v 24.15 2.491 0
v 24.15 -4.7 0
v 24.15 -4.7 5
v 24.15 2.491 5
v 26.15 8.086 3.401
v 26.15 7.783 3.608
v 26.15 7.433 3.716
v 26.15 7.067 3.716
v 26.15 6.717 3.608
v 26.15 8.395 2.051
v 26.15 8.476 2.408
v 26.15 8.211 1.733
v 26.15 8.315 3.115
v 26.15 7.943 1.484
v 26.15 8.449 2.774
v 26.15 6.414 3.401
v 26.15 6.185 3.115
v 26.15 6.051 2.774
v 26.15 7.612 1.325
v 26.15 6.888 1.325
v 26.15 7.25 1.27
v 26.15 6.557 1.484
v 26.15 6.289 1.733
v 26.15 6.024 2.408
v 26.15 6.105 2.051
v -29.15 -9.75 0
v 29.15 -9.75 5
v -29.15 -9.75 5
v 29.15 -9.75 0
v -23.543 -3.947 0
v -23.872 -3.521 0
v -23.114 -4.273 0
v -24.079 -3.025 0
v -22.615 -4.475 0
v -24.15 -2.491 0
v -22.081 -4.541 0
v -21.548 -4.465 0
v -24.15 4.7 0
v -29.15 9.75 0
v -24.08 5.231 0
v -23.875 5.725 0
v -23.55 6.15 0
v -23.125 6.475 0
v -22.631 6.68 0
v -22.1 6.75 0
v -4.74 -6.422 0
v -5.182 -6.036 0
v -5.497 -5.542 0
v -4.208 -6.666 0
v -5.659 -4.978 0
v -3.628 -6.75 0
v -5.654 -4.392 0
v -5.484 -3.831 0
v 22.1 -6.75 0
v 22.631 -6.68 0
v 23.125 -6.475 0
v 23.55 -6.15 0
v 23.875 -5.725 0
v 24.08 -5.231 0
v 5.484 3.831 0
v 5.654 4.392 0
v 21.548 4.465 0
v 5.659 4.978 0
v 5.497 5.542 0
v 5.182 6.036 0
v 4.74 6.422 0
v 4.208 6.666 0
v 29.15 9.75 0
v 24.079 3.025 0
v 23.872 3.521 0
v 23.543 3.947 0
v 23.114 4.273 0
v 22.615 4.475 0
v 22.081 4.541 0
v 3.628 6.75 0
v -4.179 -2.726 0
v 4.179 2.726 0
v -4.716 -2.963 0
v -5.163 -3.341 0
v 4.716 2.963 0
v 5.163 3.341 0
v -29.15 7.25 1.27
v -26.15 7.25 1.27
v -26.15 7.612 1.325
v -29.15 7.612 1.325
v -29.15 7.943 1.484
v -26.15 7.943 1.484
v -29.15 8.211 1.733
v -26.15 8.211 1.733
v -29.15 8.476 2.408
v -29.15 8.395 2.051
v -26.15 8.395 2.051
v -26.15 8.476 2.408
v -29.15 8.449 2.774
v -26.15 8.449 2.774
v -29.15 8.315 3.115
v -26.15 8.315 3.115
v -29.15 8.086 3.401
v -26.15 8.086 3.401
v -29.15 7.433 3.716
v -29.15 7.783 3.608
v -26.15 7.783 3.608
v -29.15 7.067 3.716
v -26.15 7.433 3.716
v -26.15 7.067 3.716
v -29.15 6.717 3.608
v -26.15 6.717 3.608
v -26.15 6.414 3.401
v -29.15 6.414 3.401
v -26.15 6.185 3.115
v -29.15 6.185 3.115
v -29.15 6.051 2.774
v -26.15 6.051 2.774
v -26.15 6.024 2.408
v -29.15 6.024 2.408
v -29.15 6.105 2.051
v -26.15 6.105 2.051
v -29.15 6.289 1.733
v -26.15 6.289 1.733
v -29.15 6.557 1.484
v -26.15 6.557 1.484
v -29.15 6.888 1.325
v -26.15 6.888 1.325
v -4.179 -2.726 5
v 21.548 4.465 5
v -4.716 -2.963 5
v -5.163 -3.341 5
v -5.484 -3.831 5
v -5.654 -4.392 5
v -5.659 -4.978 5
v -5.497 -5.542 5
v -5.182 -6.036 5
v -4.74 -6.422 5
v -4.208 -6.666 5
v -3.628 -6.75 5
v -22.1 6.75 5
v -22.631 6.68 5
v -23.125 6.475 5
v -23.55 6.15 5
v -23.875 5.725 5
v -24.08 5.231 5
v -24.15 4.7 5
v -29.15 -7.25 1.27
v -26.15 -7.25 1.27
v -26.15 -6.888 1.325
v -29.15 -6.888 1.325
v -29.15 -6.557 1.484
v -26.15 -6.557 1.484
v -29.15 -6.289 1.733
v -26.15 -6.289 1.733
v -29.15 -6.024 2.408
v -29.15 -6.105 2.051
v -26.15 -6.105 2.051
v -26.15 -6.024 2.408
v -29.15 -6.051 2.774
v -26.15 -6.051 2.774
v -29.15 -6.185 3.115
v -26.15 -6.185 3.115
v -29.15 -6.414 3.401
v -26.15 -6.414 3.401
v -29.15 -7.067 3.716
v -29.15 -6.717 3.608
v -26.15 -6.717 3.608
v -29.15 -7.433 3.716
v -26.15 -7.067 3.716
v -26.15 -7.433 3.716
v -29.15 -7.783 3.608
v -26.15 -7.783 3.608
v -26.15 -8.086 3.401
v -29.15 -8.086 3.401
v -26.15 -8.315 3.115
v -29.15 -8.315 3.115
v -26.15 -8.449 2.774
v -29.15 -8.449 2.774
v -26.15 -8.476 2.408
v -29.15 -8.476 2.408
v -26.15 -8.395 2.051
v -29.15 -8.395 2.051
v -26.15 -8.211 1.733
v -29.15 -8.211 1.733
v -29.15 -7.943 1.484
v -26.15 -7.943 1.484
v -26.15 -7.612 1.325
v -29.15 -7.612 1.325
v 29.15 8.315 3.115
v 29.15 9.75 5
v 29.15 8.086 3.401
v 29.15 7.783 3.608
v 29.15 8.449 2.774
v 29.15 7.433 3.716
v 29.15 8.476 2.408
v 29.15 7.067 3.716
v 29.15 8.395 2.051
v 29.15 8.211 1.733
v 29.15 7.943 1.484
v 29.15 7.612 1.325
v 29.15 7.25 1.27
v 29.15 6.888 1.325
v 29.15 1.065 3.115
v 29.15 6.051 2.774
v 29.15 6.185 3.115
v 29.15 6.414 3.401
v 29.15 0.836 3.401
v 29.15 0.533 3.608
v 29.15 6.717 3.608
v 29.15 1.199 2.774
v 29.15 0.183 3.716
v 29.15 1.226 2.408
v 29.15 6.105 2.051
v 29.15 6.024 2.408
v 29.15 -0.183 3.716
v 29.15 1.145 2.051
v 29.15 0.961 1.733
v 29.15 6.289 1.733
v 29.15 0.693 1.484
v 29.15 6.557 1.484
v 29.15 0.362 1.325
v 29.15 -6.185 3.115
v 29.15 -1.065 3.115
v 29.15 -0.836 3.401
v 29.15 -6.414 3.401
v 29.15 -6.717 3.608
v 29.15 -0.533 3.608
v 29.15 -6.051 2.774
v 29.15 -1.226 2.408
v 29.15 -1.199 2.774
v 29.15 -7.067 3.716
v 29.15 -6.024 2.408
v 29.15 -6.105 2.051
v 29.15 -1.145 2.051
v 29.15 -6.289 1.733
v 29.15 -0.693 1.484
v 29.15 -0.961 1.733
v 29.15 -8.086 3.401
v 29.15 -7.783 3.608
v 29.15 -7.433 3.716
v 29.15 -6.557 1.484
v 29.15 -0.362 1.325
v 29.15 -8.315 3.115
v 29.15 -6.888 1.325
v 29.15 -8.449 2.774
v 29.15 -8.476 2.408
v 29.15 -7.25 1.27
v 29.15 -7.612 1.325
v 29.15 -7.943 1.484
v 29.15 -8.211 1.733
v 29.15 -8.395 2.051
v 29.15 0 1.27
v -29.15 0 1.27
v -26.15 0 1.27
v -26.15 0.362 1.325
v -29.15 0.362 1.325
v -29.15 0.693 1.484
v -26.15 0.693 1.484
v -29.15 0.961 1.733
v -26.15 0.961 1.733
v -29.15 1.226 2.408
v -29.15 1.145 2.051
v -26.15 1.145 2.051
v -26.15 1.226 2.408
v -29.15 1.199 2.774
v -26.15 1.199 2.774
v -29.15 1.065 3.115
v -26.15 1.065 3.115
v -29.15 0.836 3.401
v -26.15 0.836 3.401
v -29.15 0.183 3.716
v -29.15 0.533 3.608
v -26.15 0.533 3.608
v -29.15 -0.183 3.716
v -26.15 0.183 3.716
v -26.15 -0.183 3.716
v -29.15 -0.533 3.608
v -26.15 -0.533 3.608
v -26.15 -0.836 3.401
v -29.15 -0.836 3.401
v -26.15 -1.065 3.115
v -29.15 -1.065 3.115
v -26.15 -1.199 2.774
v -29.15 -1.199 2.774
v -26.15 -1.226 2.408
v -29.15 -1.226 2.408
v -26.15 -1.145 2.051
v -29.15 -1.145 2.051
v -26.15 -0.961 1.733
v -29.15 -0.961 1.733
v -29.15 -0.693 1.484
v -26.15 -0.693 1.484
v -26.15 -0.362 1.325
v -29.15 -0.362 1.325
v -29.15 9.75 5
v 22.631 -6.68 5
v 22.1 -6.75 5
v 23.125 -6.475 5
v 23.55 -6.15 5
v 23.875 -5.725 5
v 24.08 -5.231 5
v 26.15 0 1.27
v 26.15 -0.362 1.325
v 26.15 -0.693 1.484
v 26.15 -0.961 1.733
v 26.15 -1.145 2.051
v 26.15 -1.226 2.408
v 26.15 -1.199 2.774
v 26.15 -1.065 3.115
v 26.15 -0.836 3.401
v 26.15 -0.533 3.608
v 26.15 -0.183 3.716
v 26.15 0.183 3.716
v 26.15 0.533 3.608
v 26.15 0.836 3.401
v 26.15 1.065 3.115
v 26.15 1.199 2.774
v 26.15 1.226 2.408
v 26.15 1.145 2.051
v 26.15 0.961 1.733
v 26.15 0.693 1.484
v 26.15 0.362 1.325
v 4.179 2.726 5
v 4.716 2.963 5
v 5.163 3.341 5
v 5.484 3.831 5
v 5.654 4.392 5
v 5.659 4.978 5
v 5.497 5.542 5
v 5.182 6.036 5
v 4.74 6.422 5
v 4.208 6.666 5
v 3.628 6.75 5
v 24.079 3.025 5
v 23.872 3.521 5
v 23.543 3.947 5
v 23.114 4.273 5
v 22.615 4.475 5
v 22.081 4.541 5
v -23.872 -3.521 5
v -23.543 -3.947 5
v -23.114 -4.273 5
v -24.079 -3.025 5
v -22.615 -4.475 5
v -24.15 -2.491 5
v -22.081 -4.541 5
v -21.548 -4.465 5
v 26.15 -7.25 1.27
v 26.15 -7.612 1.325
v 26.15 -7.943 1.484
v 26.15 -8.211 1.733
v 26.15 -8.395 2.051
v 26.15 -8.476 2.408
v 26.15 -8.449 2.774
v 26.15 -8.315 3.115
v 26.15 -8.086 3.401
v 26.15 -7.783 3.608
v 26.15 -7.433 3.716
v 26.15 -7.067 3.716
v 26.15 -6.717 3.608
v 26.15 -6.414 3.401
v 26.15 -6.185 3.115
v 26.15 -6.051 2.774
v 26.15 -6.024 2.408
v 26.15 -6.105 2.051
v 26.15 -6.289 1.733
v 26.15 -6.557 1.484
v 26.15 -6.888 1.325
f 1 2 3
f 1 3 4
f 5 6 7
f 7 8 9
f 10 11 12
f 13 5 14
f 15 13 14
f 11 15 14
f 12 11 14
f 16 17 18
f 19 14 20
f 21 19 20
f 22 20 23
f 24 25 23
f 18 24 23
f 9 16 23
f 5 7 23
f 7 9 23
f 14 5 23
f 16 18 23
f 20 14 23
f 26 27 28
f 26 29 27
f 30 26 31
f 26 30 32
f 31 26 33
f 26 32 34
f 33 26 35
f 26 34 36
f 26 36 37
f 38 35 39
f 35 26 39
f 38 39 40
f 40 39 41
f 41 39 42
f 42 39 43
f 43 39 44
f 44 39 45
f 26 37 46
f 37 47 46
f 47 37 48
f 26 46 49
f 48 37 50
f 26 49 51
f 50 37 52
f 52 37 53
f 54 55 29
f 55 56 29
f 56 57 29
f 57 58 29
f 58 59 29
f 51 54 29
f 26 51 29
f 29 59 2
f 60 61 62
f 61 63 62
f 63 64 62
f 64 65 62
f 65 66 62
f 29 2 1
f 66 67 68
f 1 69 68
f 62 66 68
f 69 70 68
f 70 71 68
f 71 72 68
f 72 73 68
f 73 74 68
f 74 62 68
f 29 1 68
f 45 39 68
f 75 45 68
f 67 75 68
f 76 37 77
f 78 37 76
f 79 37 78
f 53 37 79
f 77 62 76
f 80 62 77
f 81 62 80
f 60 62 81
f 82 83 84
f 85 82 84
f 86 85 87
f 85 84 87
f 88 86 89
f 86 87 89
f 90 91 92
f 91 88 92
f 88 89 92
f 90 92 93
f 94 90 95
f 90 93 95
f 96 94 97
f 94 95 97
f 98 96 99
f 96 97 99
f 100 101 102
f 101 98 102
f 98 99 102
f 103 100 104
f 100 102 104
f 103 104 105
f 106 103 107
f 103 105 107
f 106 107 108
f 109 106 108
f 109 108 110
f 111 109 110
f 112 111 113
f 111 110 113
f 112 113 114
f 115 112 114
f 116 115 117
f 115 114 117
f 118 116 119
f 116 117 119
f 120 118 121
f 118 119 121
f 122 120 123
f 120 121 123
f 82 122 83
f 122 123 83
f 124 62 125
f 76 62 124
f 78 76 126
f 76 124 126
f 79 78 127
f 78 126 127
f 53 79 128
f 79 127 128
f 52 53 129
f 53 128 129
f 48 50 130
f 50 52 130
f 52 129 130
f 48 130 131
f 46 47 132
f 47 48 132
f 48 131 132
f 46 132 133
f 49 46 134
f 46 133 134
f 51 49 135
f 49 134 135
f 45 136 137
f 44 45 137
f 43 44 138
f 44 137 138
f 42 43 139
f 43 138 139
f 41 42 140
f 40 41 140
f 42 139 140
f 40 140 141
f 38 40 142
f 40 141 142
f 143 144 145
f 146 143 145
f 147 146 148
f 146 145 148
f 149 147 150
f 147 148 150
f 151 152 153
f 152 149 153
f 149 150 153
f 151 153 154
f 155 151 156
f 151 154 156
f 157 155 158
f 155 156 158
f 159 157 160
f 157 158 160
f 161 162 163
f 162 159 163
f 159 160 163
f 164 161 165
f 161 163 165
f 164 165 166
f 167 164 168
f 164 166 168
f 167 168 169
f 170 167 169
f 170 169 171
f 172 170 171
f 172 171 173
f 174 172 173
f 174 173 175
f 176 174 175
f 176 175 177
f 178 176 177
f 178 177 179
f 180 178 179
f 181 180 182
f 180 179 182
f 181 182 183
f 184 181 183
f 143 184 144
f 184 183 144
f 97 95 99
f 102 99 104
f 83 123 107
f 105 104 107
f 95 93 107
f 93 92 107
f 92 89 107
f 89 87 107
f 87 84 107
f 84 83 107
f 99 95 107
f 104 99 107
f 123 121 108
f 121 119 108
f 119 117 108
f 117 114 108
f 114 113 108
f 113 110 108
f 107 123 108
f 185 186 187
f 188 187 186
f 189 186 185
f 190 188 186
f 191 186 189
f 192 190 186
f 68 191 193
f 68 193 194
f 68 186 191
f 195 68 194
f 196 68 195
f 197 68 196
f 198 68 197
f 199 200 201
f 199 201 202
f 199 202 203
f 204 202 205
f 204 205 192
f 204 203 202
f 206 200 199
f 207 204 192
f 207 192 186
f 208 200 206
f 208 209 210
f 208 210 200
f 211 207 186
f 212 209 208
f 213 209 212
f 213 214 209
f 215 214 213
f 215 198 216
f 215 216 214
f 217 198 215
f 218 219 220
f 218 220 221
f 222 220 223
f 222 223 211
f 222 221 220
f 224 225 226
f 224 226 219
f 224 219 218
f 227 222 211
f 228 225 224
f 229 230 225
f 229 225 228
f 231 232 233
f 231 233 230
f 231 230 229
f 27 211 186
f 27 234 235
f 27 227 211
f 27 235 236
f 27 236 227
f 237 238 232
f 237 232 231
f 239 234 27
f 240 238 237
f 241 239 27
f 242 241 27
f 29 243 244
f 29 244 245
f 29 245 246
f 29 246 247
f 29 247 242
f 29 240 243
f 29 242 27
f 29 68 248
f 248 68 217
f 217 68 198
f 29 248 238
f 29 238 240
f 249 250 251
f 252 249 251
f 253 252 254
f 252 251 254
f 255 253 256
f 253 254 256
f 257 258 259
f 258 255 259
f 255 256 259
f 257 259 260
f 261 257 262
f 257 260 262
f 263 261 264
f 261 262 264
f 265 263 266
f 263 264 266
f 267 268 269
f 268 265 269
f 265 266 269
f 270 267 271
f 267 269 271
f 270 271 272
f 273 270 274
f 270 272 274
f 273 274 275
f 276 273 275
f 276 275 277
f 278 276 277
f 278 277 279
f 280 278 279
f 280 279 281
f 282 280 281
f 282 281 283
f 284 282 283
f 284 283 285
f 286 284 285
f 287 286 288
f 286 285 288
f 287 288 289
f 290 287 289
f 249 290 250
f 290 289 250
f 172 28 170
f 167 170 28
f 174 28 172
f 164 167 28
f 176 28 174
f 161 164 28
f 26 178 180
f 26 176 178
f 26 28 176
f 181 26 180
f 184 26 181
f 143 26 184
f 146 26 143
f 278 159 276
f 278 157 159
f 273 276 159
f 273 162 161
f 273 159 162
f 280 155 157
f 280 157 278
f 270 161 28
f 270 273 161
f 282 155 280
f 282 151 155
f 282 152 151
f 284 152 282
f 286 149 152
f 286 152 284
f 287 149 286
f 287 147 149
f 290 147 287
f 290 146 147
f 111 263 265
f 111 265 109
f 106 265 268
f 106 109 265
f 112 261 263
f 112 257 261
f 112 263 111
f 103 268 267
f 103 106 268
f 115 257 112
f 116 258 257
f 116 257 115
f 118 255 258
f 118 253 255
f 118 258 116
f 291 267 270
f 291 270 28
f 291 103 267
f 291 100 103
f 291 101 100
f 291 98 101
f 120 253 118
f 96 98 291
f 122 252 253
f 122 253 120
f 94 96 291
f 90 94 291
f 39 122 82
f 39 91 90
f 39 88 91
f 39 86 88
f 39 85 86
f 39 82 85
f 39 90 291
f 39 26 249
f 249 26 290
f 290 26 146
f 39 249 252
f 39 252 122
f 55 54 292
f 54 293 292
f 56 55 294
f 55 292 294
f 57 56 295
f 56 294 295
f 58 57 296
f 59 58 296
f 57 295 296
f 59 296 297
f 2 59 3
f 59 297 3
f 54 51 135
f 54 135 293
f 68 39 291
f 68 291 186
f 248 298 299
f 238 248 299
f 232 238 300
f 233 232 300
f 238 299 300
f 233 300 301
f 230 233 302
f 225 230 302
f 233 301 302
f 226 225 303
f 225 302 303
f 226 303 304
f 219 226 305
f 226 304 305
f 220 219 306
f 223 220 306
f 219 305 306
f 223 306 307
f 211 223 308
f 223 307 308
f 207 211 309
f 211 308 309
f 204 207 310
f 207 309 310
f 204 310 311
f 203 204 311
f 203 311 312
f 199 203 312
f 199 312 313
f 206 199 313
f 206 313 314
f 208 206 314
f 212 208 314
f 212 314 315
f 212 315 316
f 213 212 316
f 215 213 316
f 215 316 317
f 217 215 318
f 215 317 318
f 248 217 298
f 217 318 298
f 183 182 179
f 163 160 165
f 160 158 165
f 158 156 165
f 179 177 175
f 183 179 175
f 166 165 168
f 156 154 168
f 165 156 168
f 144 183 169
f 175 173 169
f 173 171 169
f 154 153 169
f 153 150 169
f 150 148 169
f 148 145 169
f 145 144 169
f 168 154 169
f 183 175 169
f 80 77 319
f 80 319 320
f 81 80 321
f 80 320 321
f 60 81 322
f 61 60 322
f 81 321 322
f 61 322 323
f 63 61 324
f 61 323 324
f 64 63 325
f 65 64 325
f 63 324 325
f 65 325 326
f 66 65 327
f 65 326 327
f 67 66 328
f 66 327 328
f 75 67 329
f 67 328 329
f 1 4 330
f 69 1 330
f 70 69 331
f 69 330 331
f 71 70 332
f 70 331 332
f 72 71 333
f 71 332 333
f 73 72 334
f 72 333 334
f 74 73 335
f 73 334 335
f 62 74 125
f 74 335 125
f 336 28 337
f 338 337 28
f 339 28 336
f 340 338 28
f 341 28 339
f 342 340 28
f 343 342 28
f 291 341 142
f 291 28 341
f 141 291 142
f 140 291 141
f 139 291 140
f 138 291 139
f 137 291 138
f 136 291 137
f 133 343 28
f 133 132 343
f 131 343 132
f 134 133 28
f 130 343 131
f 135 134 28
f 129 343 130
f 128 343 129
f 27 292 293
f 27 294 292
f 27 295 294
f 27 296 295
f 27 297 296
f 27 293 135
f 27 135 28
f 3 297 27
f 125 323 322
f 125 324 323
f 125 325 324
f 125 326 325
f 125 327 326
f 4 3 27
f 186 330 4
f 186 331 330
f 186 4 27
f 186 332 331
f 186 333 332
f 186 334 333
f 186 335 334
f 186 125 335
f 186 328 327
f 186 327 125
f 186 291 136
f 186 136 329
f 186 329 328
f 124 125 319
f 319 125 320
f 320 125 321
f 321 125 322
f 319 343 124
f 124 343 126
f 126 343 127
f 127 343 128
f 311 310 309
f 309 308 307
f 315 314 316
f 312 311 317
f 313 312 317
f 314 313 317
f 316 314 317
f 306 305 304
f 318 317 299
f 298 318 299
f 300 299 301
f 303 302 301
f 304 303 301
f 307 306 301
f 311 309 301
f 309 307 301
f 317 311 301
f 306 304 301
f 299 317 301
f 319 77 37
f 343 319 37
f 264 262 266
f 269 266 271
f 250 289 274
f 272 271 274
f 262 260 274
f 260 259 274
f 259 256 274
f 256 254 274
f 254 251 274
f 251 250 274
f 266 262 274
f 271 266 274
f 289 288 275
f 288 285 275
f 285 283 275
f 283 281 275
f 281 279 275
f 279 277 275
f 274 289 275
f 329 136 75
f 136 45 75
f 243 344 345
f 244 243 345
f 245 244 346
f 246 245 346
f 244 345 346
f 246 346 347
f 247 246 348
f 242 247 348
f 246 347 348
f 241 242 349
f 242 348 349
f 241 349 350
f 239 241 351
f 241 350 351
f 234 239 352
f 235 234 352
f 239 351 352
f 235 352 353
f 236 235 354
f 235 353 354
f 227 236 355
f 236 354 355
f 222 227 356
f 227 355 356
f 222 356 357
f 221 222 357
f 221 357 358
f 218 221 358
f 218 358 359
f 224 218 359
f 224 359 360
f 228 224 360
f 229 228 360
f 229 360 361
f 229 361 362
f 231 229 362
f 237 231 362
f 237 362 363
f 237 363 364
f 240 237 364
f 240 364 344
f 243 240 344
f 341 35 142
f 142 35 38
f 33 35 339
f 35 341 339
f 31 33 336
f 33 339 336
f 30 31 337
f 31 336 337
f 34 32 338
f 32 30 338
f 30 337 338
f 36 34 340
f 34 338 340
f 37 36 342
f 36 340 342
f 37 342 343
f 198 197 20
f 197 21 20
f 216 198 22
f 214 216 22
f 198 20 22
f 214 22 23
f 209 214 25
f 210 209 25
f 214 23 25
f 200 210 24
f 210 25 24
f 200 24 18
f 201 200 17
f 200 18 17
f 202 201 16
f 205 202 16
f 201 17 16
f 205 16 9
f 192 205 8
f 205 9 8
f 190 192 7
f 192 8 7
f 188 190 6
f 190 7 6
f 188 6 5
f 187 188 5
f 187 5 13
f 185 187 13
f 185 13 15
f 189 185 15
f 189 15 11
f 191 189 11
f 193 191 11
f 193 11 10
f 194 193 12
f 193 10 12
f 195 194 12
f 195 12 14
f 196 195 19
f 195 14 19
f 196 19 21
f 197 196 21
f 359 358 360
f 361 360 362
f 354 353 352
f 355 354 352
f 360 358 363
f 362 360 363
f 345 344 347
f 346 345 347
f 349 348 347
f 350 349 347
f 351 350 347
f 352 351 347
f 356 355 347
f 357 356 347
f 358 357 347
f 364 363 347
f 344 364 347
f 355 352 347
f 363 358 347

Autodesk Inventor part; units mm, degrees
ref_plane "YZ Plane" through (0, 0, 0) normal (1, 0, 0) x (0, 1, 0)
ref_plane "XZ Plane" through (0, 0, 0) normal (0, 1, 0) x (-1, 0, 0)
ref_plane "XY Plane" through (0, 0, 0) normal (0, 0, 1) x (1, 0, 0)
sketch "スケッチ1" plane through (0, 0, 0) normal (0, 0, 1) x (1, 0, 0)
  line L0 (-29.15, 9.75) -> (29.15, 9.75)
  line L1 (29.15, 9.75) -> (29.15, -9.75)
  line L2 (29.15, -9.75) -> (-29.15, -9.75)
  line L3 (-29.15, -9.75) -> (-29.15, 9.75)
  line L4 (-24.15, 6.75) -> (24.15, 6.75) construction
  line L5 (24.15, 6.75) -> (24.15, -6.75) construction
  line L6 (24.15, -6.75) -> (-24.15, -6.75) construction
  line L7 (-24.15, -6.75) -> (-24.15, 6.75) construction
  line L8 (24.15, 6.75) -> (-24.15, -6.75) construction
  line L9 (-24.15, -5.1925) -> (-24.15, 6.75)
  line L10 (-24.15, 6.75) -> (18.5776, 6.75)
  line L11 (18.5776, 6.75) -> (-24.15, -5.1925)
  line L12 (-18.5776, -6.75) -> (24.15, -6.75)
  line L13 (24.15, -6.75) -> (24.15, 5.1925)
  line L14 (24.15, 5.1925) -> (-18.5776, -6.75)
  line L15 (-29.15, 7.25) -> (29.15, 7.25) construction
  line L16 (29.15, -7.25) -> (-29.15, -7.25) construction
  line L17 (29.15, 7.25) -> (29.15, -7.25) construction
  point P0 (0, 0)
  point P1 (0, 6.75)
  point P2 (0, 9.75)
  point P3 (24.15, 0)
  point P4 (29.15, 0)
  dimension "d0" = 5
  dimension "d1" = 3
  dimension "d2" = 1.5
  dimension "d3" = 14.5
  dimension "d4" = 2.5
  dimension "d16" = 58.3
extrude "押し出し1" add sketch "スケッチ1" along normal blind 5
sketch "スケッチ2" plane through (29.15, -9.75, 0) normal (1, 0, 0) x (0, 0, -1)
  line L0 (0, 19.5) -> (-5, 19.5) projected
  line L1 (-5, 0) -> (-5, 19.5) projected
  line L2 (0, 9.75) -> (-5, 9.75) construction
  point P0 (-2.5, 2.5)
  point P1 (-2.5, 9.75)
  point P2 (-2.5, 17)
  point P3 (-2.5, 19.5)
  dimension "d7" = 14.5
hole "穴1" at (29.15, -7.25, 2.5) at (29.15, 7.25, 2.5) at (29.15, 0, 2.5) direction (-1, 0, 0) diameter 2.459 depth 3 thread size "M3x0.5" class "6H" standard "ISO Metric profile"
mirror "ミラー1" about plane through (0, 0, 0) normal (1, 0, 0) of "穴1"
fillet "フィレット3" radius 2.05 6 edges at (-24.15, 6.75, 2.5) (18.5776, 6.75, 2.5) (24.15, 5.1925, 2.5) (24.15, -6.75, 2.5) (-18.5776, -6.75, 2.5) (-24.15, -5.1925, 2.5)
equation "\"d7\" = d3"
properties part number "リンク_ふくらはぎ_サブフレーム_1_2(予備案)" material "アルミニウム 2014-T4"
